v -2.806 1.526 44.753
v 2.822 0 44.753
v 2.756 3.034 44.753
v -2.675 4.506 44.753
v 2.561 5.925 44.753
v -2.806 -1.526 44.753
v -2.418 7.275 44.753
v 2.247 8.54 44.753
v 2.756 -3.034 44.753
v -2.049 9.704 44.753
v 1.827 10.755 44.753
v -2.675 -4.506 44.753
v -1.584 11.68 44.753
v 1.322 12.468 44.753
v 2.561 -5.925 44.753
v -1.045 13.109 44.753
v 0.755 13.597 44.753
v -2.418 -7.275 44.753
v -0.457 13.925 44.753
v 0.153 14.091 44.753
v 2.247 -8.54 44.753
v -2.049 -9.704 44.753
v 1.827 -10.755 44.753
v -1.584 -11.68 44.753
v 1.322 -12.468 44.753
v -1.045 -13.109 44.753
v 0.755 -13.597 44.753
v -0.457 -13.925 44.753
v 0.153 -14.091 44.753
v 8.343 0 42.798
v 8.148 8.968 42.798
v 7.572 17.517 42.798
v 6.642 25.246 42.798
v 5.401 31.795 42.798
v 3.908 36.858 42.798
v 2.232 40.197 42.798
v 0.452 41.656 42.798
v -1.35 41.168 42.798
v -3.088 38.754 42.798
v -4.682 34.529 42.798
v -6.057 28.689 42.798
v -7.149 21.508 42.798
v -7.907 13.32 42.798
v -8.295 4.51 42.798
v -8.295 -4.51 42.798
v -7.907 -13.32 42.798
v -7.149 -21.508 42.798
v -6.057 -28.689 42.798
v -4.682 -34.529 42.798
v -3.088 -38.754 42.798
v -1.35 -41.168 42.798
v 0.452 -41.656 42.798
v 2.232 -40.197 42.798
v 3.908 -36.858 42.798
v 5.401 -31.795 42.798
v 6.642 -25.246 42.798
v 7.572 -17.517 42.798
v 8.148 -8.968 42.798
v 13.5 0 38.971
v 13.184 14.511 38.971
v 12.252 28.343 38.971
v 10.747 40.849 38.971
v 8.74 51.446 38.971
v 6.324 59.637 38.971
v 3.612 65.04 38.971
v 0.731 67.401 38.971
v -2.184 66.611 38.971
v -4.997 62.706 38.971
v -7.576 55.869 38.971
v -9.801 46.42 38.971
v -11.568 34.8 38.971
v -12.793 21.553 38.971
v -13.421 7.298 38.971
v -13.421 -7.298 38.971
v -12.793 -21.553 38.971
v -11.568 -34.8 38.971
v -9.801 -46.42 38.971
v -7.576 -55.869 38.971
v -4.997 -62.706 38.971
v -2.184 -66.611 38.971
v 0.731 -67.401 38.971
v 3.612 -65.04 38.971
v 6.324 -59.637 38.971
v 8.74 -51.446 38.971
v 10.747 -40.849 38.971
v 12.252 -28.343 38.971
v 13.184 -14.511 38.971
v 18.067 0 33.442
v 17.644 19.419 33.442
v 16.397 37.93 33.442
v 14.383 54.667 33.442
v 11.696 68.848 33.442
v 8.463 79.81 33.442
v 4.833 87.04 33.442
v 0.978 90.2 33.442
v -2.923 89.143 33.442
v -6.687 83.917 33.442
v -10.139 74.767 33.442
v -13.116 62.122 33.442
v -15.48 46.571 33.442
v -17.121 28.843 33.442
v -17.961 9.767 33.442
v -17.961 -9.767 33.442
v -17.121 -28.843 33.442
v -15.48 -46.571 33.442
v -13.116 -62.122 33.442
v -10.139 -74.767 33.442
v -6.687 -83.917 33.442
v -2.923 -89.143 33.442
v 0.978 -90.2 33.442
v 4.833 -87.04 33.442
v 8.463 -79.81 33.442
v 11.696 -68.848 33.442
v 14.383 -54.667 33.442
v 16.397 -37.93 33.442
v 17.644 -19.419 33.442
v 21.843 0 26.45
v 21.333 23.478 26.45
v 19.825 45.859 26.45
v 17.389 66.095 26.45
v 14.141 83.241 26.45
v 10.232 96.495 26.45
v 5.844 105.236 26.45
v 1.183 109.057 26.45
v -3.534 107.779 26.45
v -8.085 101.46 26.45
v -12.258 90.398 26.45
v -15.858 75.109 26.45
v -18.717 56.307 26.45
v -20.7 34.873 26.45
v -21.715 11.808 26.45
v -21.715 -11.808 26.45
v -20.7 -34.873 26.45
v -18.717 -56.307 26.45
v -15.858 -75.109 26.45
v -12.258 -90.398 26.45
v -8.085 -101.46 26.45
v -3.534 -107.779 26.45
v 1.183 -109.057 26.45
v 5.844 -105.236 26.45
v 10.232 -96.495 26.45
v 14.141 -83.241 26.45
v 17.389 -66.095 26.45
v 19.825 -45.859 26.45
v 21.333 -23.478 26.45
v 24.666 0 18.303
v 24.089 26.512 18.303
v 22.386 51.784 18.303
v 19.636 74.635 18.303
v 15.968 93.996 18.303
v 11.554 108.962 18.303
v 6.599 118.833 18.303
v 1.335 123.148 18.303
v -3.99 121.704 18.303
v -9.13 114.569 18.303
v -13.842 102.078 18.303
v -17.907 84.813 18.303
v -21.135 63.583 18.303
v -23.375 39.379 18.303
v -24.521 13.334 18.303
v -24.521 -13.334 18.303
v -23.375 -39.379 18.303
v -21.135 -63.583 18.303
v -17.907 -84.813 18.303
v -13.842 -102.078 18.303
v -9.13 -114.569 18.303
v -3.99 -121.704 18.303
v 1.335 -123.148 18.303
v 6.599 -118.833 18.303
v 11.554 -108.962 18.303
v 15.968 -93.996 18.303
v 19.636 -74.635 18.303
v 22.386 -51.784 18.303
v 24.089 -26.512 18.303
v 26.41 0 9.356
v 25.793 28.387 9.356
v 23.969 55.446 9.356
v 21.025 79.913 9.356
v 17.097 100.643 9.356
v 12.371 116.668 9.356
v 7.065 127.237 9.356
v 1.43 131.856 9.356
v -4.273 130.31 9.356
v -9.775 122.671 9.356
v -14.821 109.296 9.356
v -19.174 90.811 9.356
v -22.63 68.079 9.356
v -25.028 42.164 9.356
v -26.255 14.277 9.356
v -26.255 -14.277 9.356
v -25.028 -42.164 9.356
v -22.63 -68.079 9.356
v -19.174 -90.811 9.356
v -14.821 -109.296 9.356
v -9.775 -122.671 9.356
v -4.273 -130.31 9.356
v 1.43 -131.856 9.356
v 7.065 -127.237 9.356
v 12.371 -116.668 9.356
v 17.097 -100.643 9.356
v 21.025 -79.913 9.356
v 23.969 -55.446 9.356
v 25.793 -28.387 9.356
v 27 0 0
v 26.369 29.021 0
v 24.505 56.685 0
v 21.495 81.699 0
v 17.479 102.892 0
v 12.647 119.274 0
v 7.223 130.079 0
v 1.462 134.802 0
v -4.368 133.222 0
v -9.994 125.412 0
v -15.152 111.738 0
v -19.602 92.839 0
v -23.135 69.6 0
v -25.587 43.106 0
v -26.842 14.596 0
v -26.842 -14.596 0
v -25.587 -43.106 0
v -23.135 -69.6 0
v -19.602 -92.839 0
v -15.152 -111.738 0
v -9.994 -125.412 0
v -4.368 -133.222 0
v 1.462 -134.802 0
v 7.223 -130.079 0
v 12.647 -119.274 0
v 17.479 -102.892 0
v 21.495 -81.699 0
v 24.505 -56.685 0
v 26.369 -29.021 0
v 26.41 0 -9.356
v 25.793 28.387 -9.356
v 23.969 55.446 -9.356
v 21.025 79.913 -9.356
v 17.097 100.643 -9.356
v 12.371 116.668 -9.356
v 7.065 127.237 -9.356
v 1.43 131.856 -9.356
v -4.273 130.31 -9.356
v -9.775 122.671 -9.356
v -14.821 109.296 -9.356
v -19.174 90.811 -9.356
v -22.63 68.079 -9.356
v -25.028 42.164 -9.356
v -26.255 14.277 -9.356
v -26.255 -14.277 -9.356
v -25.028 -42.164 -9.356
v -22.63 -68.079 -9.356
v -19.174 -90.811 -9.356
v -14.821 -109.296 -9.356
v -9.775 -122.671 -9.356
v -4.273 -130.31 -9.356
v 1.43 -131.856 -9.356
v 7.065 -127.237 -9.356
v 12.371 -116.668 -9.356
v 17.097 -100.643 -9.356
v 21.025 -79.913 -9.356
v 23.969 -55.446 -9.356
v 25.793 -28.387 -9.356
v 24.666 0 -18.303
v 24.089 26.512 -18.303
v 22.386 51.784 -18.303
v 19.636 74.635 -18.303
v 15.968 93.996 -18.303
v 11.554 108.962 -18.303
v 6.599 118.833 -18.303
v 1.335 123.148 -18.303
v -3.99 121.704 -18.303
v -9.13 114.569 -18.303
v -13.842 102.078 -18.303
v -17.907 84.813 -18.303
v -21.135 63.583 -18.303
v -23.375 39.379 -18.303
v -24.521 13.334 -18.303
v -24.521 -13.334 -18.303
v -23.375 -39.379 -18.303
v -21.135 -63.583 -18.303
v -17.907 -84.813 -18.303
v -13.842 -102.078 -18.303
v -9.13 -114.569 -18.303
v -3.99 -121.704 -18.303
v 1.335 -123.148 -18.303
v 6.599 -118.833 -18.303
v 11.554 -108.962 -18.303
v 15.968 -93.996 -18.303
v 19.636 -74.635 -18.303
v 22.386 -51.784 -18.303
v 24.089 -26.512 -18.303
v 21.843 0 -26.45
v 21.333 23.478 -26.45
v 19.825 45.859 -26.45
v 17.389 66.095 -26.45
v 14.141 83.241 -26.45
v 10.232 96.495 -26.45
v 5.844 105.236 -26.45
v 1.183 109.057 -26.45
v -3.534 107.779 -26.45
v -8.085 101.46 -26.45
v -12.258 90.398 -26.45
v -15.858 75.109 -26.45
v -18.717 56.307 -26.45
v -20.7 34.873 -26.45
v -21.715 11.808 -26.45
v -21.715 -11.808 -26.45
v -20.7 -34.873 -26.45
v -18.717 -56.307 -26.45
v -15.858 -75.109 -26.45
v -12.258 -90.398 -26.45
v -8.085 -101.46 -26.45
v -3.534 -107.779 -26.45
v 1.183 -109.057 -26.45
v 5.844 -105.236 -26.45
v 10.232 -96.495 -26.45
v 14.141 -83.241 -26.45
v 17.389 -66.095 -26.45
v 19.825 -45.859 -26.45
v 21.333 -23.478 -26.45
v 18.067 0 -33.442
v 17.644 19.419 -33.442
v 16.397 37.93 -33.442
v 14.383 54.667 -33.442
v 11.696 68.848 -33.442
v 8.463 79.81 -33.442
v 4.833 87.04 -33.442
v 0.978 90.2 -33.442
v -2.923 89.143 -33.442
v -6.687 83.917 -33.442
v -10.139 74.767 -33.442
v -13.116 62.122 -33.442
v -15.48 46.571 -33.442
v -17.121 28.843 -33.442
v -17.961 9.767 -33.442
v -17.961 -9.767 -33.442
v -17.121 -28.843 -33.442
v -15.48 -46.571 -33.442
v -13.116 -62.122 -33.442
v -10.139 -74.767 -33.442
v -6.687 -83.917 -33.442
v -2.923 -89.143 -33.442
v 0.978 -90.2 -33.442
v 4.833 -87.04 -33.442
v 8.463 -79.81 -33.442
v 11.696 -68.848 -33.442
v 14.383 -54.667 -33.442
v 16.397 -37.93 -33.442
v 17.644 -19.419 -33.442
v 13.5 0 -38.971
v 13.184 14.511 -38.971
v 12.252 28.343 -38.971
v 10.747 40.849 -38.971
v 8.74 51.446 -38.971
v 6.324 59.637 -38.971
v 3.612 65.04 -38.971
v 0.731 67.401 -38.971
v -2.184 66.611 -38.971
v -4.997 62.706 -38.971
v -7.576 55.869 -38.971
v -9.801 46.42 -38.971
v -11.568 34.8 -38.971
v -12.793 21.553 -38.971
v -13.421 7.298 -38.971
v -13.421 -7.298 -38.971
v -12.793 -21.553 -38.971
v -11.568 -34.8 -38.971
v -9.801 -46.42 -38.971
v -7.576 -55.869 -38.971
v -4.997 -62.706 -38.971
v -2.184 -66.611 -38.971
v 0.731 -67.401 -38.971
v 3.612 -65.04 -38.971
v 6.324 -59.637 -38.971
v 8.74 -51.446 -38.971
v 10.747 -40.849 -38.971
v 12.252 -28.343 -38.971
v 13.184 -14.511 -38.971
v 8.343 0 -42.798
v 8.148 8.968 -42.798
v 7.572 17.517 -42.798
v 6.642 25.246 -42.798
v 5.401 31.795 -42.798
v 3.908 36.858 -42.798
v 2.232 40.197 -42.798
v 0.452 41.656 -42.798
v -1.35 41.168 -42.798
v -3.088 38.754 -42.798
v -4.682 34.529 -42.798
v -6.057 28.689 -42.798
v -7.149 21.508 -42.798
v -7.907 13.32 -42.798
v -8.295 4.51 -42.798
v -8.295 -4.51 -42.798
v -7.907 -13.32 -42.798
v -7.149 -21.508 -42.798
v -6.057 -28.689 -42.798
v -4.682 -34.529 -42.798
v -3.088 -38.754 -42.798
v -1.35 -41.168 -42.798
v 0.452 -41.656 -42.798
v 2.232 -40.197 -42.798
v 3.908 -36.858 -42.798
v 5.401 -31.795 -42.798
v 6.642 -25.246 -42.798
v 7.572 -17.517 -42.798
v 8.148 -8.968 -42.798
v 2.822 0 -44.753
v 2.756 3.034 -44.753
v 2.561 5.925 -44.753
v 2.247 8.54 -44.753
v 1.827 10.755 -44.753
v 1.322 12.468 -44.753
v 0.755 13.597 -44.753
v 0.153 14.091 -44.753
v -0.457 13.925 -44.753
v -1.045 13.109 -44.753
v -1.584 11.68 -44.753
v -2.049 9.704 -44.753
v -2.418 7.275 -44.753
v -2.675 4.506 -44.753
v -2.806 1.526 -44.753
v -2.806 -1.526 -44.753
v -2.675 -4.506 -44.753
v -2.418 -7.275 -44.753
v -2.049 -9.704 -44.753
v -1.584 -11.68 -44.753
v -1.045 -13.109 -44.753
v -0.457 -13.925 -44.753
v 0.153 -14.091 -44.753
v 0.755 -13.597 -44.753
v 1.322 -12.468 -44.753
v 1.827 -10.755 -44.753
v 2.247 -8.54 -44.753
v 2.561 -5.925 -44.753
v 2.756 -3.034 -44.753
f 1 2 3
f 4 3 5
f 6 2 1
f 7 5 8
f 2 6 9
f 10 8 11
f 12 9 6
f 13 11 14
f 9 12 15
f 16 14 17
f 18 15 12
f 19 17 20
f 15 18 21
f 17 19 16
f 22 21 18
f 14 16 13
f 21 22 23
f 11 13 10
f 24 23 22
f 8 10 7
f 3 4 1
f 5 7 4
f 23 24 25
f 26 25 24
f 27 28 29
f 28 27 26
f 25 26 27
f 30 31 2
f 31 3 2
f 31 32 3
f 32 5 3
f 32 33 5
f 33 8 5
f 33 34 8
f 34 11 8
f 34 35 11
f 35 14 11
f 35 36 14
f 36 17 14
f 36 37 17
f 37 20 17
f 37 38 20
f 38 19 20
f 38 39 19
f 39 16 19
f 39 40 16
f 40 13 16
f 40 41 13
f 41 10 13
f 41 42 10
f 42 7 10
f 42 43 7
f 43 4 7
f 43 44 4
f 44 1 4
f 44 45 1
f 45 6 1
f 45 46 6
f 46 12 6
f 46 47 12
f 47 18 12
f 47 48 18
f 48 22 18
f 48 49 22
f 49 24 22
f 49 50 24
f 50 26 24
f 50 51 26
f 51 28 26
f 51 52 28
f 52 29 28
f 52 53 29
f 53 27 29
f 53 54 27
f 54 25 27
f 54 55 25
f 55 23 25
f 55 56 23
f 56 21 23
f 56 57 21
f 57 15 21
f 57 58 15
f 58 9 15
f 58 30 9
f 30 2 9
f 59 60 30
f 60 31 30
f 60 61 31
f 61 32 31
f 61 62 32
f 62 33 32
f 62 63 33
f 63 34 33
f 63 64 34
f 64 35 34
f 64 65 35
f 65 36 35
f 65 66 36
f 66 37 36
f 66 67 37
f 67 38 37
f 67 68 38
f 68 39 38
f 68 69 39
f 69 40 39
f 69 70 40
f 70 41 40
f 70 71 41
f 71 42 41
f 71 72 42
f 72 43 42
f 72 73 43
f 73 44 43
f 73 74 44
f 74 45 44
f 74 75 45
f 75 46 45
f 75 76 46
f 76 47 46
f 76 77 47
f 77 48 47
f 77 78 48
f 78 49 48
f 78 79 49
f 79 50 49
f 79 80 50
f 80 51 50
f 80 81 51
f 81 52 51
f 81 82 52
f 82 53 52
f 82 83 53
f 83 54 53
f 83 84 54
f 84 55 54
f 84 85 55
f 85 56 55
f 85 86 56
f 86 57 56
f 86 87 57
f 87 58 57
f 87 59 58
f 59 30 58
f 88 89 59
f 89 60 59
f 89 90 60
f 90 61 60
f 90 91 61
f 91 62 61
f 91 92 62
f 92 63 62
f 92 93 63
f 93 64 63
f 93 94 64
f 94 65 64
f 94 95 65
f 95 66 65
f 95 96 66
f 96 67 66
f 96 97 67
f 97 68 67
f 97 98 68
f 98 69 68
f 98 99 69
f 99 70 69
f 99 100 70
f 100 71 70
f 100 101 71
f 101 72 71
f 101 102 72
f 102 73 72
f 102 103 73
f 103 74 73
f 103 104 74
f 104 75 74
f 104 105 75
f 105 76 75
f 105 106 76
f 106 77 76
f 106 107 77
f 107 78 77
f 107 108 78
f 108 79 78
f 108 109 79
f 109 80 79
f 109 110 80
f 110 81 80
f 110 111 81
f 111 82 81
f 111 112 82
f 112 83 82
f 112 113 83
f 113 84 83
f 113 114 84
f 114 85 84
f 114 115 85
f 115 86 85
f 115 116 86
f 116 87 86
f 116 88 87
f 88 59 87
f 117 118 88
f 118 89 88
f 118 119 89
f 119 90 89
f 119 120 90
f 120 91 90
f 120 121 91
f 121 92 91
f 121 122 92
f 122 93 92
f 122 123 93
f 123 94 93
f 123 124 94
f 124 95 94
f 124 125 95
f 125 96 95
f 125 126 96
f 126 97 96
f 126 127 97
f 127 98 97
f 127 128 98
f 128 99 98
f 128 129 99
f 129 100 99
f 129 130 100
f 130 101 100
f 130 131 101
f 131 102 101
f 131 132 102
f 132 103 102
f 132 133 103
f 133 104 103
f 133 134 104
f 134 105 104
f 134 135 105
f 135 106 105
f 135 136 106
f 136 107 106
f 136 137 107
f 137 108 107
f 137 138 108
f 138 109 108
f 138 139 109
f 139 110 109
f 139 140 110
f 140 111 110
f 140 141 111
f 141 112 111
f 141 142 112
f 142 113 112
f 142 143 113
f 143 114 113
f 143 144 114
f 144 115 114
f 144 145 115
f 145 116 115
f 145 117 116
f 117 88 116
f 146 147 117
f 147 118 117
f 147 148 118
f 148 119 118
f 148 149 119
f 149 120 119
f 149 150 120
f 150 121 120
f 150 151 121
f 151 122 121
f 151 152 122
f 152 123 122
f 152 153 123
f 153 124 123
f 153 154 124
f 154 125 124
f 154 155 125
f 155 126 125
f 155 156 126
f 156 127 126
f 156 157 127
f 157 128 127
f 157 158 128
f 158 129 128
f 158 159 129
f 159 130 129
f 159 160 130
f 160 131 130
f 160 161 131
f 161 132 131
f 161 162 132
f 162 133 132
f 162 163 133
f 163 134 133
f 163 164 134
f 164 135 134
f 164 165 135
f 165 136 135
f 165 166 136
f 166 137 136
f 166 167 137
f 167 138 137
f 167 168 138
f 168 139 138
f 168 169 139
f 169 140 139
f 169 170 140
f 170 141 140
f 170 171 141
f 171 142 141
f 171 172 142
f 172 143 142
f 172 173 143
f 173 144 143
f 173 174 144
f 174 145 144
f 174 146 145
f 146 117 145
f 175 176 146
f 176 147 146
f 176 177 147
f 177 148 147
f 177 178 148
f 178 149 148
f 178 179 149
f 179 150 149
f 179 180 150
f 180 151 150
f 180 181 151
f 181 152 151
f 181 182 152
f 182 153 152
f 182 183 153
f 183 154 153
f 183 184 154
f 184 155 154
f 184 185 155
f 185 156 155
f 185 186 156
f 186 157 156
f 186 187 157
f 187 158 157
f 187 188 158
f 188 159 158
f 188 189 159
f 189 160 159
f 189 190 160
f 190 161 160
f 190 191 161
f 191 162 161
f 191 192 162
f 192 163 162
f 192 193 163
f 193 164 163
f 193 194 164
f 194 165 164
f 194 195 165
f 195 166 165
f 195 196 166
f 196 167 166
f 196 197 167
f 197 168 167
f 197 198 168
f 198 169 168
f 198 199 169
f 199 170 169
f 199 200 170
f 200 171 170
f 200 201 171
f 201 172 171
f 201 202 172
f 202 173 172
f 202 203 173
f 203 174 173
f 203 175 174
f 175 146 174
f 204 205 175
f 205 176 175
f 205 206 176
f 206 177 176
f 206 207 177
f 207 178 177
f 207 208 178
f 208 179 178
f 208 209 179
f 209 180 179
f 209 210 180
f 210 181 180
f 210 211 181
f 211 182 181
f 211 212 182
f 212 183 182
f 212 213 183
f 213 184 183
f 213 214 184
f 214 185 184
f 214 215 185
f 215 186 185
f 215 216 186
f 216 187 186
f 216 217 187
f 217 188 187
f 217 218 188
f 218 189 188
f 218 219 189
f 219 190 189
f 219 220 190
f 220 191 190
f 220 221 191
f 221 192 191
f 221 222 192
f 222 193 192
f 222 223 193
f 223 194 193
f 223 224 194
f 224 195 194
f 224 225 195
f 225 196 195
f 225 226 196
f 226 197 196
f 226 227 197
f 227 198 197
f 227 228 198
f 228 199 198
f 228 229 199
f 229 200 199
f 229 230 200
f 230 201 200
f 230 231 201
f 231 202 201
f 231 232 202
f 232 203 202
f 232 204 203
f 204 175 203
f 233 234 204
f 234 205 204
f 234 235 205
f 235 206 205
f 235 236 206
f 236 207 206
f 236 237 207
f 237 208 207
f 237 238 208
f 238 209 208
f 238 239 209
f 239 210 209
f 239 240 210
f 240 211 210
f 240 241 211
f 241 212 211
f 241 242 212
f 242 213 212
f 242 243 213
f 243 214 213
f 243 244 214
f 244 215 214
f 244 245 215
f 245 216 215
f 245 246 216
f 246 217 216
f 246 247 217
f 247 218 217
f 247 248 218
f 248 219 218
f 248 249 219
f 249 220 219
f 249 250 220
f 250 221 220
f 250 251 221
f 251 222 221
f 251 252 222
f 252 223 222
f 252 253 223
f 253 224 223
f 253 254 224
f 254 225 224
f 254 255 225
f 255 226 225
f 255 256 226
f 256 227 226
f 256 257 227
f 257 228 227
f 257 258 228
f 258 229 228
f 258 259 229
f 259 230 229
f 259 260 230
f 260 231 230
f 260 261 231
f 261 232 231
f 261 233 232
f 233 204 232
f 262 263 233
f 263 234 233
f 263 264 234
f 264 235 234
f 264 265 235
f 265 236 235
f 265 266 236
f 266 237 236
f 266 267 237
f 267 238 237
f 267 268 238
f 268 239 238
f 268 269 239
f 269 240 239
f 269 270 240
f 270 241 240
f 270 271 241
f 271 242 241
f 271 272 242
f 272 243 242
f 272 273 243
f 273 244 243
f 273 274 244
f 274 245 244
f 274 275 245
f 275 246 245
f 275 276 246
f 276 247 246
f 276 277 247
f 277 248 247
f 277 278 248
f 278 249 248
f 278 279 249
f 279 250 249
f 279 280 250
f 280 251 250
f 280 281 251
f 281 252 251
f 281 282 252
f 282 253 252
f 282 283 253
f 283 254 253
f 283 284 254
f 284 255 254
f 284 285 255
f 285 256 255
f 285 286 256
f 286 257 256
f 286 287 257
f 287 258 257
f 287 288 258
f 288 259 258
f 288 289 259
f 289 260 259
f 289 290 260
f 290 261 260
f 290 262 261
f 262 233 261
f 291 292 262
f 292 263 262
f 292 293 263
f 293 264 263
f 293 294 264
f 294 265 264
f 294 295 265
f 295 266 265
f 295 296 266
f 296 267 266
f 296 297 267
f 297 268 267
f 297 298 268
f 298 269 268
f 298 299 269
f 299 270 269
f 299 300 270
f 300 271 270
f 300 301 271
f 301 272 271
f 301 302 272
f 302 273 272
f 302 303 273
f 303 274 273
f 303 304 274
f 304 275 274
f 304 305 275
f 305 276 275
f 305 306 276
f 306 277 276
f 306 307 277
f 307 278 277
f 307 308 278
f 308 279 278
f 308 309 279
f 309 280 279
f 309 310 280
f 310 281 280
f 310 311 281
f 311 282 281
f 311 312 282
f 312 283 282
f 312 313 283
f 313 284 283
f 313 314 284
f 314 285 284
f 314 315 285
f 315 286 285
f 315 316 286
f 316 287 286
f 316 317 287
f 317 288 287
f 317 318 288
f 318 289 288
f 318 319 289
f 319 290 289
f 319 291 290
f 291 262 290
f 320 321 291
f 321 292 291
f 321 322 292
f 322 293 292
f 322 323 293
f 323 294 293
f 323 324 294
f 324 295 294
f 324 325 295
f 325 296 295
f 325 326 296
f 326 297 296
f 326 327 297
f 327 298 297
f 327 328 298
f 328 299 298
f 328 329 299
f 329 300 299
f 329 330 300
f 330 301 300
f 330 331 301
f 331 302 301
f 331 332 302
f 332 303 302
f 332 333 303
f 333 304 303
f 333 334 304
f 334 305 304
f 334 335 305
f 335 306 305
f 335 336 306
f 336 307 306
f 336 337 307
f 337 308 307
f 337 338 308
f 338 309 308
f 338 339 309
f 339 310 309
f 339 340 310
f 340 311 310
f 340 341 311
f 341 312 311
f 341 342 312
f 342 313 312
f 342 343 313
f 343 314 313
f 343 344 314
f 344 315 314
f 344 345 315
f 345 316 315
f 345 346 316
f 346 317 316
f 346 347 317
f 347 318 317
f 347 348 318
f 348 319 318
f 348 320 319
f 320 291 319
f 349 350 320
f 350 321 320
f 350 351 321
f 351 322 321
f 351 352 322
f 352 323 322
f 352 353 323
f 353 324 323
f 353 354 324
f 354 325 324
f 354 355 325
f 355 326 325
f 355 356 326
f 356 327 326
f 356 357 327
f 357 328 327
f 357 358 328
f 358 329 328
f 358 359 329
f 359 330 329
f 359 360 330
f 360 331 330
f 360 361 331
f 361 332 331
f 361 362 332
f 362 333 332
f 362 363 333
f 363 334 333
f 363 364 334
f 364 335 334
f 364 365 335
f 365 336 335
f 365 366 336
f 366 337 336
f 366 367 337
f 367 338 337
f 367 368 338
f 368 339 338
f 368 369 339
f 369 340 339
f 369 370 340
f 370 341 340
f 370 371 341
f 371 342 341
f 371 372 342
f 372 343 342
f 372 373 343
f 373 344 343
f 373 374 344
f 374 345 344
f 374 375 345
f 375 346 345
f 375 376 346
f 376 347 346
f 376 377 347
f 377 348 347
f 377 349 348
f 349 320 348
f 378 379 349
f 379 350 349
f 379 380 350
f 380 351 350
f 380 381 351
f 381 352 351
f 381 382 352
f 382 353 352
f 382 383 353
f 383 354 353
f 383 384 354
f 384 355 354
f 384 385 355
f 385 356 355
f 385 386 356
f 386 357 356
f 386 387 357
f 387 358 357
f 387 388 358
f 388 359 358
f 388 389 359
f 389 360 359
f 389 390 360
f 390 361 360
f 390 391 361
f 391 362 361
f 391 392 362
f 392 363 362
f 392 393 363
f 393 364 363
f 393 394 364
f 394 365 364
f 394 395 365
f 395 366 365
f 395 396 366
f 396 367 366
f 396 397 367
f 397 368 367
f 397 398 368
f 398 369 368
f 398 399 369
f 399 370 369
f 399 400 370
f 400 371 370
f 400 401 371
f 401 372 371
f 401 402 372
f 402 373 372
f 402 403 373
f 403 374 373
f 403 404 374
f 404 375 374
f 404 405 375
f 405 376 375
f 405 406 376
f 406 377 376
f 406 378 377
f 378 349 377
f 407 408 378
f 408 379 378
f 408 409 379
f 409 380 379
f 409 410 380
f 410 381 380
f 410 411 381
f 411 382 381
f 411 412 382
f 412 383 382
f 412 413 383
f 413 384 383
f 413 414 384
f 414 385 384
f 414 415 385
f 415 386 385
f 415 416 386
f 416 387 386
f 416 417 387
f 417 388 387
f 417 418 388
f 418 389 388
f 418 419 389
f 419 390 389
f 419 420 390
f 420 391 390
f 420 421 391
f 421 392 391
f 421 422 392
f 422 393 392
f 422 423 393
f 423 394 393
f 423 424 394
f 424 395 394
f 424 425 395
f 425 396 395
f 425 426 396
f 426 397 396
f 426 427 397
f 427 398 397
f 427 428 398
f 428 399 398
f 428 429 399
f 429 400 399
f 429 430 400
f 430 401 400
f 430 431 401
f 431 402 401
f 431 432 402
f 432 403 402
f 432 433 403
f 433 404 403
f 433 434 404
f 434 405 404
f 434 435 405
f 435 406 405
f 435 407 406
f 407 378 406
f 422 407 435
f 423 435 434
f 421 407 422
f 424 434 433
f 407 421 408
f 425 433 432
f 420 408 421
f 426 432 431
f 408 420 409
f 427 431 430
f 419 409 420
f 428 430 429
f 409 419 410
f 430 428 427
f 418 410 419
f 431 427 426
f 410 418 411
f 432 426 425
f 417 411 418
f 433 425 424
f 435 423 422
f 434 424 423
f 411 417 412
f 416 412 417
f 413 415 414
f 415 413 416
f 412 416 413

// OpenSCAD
// Generated by SolidPython 1.0.1 on 2020-07-29 00:46:45


scale(v = [3, 15, 5]) {
	sphere(r = 9);
}
/***********************************************
*********      SolidPython code:      **********
************************************************
 
# import packages: SolidPython
from solid import *
from solid.utils import *
from itertools import chain, combinations, permutations


class Resize:

    def __init__(self, scad_file):
        self.scad_file = scad_file
        #self.scad_file = import_scad(scad_file)
        # cone/cylinder param:
        self.r1 = 0
        self.r2 = 0
        self.h = 0
        # rectangular prism param:
        self.w = 0
        self.l = 0
        # ellipse param:
        self.r = 0

    # import OpenScad code (file name corresponds to shape)


    # classify shape + parameters
    def assign(self, param1, param2, param3):
        if self.scad_file == 'cone.scad':
            self.r1 = param1
            self.r2 = param2
            self.h = param3
        elif self.scad_file == 'cylinder.scad':
            self.r1 = param1
            self.r2 = param2
            self.h = param3
        elif self.scad_file == 'rectangularPrism.scad':
            self.h = param1
            self.l = param2
            self.w = param3
        else:
            self.r = param1
            self.h = param2

    # resize parameters
    def iterate(self):
        x = range(3, 20, 2)
        i = 1
        if self.scad_file == 'cone.scad':
            tempList = list(permutations(x, 2))
            for temp in tempList:
                param1 = temp[0]
                param2 = temp[1]
                filepath = 'produced_scad_files/' + 'cone' + str(param1) + '_' + str(param2) + '_' + '.scad'
                scad_render_to_file(cylinder(h=param1, r1=param2, r2=0), filepath)

        elif self.scad_file == 'cylinder.scad':
            tempList = list(permutations(x, 3))
            for temp in tempList:
                param1 = temp[0]
                param2 = temp[1]
                filepath = 'produced_scad_files/' + 'cylinder' + str(param1) + '_' + str(param2) + '_' + '.scad'
                scad_render_to_file(cylinder(h=param1, r1=param2, r2=param2), filepath)

        elif self.scad_file == 'rectangularPrism.scad':
            tempList = list(permutations(x, 3))
            for temp in tempList:
                param1 = temp[0]
                param2 = temp[1]
                param3 = temp[2]
                filepath = 'produced_scad_files/' + 'rectangularPrism' + str(param1) + '_' + str(param2) + '_' + str(
                    param3) + '.scad'
                scad_render_to_file(cube(size=(param1, param2, param3)), filepath)

        elif self.scad_file == 'ellipse.scad':
            tempList = list(permutations(x, 4))
            for temp in tempList:
                param1 = temp[0]
                param2 = temp[1]
                param3 = temp[2]
                param4 = temp[3]
                filepath = 'produced_scad_files/' + 'ellipse' + str(param1) + '_' + str(param2) + '_' + str(param3) + '_' + str(param4) + '.scad'
                scad_render_to_file(scale([param1, param2, param3])(sphere(r=param4)), filepath)

    def render_to_scadfile(self):
        scad_render_to_file(scad, 'example.scad') 
 
************************************************/
